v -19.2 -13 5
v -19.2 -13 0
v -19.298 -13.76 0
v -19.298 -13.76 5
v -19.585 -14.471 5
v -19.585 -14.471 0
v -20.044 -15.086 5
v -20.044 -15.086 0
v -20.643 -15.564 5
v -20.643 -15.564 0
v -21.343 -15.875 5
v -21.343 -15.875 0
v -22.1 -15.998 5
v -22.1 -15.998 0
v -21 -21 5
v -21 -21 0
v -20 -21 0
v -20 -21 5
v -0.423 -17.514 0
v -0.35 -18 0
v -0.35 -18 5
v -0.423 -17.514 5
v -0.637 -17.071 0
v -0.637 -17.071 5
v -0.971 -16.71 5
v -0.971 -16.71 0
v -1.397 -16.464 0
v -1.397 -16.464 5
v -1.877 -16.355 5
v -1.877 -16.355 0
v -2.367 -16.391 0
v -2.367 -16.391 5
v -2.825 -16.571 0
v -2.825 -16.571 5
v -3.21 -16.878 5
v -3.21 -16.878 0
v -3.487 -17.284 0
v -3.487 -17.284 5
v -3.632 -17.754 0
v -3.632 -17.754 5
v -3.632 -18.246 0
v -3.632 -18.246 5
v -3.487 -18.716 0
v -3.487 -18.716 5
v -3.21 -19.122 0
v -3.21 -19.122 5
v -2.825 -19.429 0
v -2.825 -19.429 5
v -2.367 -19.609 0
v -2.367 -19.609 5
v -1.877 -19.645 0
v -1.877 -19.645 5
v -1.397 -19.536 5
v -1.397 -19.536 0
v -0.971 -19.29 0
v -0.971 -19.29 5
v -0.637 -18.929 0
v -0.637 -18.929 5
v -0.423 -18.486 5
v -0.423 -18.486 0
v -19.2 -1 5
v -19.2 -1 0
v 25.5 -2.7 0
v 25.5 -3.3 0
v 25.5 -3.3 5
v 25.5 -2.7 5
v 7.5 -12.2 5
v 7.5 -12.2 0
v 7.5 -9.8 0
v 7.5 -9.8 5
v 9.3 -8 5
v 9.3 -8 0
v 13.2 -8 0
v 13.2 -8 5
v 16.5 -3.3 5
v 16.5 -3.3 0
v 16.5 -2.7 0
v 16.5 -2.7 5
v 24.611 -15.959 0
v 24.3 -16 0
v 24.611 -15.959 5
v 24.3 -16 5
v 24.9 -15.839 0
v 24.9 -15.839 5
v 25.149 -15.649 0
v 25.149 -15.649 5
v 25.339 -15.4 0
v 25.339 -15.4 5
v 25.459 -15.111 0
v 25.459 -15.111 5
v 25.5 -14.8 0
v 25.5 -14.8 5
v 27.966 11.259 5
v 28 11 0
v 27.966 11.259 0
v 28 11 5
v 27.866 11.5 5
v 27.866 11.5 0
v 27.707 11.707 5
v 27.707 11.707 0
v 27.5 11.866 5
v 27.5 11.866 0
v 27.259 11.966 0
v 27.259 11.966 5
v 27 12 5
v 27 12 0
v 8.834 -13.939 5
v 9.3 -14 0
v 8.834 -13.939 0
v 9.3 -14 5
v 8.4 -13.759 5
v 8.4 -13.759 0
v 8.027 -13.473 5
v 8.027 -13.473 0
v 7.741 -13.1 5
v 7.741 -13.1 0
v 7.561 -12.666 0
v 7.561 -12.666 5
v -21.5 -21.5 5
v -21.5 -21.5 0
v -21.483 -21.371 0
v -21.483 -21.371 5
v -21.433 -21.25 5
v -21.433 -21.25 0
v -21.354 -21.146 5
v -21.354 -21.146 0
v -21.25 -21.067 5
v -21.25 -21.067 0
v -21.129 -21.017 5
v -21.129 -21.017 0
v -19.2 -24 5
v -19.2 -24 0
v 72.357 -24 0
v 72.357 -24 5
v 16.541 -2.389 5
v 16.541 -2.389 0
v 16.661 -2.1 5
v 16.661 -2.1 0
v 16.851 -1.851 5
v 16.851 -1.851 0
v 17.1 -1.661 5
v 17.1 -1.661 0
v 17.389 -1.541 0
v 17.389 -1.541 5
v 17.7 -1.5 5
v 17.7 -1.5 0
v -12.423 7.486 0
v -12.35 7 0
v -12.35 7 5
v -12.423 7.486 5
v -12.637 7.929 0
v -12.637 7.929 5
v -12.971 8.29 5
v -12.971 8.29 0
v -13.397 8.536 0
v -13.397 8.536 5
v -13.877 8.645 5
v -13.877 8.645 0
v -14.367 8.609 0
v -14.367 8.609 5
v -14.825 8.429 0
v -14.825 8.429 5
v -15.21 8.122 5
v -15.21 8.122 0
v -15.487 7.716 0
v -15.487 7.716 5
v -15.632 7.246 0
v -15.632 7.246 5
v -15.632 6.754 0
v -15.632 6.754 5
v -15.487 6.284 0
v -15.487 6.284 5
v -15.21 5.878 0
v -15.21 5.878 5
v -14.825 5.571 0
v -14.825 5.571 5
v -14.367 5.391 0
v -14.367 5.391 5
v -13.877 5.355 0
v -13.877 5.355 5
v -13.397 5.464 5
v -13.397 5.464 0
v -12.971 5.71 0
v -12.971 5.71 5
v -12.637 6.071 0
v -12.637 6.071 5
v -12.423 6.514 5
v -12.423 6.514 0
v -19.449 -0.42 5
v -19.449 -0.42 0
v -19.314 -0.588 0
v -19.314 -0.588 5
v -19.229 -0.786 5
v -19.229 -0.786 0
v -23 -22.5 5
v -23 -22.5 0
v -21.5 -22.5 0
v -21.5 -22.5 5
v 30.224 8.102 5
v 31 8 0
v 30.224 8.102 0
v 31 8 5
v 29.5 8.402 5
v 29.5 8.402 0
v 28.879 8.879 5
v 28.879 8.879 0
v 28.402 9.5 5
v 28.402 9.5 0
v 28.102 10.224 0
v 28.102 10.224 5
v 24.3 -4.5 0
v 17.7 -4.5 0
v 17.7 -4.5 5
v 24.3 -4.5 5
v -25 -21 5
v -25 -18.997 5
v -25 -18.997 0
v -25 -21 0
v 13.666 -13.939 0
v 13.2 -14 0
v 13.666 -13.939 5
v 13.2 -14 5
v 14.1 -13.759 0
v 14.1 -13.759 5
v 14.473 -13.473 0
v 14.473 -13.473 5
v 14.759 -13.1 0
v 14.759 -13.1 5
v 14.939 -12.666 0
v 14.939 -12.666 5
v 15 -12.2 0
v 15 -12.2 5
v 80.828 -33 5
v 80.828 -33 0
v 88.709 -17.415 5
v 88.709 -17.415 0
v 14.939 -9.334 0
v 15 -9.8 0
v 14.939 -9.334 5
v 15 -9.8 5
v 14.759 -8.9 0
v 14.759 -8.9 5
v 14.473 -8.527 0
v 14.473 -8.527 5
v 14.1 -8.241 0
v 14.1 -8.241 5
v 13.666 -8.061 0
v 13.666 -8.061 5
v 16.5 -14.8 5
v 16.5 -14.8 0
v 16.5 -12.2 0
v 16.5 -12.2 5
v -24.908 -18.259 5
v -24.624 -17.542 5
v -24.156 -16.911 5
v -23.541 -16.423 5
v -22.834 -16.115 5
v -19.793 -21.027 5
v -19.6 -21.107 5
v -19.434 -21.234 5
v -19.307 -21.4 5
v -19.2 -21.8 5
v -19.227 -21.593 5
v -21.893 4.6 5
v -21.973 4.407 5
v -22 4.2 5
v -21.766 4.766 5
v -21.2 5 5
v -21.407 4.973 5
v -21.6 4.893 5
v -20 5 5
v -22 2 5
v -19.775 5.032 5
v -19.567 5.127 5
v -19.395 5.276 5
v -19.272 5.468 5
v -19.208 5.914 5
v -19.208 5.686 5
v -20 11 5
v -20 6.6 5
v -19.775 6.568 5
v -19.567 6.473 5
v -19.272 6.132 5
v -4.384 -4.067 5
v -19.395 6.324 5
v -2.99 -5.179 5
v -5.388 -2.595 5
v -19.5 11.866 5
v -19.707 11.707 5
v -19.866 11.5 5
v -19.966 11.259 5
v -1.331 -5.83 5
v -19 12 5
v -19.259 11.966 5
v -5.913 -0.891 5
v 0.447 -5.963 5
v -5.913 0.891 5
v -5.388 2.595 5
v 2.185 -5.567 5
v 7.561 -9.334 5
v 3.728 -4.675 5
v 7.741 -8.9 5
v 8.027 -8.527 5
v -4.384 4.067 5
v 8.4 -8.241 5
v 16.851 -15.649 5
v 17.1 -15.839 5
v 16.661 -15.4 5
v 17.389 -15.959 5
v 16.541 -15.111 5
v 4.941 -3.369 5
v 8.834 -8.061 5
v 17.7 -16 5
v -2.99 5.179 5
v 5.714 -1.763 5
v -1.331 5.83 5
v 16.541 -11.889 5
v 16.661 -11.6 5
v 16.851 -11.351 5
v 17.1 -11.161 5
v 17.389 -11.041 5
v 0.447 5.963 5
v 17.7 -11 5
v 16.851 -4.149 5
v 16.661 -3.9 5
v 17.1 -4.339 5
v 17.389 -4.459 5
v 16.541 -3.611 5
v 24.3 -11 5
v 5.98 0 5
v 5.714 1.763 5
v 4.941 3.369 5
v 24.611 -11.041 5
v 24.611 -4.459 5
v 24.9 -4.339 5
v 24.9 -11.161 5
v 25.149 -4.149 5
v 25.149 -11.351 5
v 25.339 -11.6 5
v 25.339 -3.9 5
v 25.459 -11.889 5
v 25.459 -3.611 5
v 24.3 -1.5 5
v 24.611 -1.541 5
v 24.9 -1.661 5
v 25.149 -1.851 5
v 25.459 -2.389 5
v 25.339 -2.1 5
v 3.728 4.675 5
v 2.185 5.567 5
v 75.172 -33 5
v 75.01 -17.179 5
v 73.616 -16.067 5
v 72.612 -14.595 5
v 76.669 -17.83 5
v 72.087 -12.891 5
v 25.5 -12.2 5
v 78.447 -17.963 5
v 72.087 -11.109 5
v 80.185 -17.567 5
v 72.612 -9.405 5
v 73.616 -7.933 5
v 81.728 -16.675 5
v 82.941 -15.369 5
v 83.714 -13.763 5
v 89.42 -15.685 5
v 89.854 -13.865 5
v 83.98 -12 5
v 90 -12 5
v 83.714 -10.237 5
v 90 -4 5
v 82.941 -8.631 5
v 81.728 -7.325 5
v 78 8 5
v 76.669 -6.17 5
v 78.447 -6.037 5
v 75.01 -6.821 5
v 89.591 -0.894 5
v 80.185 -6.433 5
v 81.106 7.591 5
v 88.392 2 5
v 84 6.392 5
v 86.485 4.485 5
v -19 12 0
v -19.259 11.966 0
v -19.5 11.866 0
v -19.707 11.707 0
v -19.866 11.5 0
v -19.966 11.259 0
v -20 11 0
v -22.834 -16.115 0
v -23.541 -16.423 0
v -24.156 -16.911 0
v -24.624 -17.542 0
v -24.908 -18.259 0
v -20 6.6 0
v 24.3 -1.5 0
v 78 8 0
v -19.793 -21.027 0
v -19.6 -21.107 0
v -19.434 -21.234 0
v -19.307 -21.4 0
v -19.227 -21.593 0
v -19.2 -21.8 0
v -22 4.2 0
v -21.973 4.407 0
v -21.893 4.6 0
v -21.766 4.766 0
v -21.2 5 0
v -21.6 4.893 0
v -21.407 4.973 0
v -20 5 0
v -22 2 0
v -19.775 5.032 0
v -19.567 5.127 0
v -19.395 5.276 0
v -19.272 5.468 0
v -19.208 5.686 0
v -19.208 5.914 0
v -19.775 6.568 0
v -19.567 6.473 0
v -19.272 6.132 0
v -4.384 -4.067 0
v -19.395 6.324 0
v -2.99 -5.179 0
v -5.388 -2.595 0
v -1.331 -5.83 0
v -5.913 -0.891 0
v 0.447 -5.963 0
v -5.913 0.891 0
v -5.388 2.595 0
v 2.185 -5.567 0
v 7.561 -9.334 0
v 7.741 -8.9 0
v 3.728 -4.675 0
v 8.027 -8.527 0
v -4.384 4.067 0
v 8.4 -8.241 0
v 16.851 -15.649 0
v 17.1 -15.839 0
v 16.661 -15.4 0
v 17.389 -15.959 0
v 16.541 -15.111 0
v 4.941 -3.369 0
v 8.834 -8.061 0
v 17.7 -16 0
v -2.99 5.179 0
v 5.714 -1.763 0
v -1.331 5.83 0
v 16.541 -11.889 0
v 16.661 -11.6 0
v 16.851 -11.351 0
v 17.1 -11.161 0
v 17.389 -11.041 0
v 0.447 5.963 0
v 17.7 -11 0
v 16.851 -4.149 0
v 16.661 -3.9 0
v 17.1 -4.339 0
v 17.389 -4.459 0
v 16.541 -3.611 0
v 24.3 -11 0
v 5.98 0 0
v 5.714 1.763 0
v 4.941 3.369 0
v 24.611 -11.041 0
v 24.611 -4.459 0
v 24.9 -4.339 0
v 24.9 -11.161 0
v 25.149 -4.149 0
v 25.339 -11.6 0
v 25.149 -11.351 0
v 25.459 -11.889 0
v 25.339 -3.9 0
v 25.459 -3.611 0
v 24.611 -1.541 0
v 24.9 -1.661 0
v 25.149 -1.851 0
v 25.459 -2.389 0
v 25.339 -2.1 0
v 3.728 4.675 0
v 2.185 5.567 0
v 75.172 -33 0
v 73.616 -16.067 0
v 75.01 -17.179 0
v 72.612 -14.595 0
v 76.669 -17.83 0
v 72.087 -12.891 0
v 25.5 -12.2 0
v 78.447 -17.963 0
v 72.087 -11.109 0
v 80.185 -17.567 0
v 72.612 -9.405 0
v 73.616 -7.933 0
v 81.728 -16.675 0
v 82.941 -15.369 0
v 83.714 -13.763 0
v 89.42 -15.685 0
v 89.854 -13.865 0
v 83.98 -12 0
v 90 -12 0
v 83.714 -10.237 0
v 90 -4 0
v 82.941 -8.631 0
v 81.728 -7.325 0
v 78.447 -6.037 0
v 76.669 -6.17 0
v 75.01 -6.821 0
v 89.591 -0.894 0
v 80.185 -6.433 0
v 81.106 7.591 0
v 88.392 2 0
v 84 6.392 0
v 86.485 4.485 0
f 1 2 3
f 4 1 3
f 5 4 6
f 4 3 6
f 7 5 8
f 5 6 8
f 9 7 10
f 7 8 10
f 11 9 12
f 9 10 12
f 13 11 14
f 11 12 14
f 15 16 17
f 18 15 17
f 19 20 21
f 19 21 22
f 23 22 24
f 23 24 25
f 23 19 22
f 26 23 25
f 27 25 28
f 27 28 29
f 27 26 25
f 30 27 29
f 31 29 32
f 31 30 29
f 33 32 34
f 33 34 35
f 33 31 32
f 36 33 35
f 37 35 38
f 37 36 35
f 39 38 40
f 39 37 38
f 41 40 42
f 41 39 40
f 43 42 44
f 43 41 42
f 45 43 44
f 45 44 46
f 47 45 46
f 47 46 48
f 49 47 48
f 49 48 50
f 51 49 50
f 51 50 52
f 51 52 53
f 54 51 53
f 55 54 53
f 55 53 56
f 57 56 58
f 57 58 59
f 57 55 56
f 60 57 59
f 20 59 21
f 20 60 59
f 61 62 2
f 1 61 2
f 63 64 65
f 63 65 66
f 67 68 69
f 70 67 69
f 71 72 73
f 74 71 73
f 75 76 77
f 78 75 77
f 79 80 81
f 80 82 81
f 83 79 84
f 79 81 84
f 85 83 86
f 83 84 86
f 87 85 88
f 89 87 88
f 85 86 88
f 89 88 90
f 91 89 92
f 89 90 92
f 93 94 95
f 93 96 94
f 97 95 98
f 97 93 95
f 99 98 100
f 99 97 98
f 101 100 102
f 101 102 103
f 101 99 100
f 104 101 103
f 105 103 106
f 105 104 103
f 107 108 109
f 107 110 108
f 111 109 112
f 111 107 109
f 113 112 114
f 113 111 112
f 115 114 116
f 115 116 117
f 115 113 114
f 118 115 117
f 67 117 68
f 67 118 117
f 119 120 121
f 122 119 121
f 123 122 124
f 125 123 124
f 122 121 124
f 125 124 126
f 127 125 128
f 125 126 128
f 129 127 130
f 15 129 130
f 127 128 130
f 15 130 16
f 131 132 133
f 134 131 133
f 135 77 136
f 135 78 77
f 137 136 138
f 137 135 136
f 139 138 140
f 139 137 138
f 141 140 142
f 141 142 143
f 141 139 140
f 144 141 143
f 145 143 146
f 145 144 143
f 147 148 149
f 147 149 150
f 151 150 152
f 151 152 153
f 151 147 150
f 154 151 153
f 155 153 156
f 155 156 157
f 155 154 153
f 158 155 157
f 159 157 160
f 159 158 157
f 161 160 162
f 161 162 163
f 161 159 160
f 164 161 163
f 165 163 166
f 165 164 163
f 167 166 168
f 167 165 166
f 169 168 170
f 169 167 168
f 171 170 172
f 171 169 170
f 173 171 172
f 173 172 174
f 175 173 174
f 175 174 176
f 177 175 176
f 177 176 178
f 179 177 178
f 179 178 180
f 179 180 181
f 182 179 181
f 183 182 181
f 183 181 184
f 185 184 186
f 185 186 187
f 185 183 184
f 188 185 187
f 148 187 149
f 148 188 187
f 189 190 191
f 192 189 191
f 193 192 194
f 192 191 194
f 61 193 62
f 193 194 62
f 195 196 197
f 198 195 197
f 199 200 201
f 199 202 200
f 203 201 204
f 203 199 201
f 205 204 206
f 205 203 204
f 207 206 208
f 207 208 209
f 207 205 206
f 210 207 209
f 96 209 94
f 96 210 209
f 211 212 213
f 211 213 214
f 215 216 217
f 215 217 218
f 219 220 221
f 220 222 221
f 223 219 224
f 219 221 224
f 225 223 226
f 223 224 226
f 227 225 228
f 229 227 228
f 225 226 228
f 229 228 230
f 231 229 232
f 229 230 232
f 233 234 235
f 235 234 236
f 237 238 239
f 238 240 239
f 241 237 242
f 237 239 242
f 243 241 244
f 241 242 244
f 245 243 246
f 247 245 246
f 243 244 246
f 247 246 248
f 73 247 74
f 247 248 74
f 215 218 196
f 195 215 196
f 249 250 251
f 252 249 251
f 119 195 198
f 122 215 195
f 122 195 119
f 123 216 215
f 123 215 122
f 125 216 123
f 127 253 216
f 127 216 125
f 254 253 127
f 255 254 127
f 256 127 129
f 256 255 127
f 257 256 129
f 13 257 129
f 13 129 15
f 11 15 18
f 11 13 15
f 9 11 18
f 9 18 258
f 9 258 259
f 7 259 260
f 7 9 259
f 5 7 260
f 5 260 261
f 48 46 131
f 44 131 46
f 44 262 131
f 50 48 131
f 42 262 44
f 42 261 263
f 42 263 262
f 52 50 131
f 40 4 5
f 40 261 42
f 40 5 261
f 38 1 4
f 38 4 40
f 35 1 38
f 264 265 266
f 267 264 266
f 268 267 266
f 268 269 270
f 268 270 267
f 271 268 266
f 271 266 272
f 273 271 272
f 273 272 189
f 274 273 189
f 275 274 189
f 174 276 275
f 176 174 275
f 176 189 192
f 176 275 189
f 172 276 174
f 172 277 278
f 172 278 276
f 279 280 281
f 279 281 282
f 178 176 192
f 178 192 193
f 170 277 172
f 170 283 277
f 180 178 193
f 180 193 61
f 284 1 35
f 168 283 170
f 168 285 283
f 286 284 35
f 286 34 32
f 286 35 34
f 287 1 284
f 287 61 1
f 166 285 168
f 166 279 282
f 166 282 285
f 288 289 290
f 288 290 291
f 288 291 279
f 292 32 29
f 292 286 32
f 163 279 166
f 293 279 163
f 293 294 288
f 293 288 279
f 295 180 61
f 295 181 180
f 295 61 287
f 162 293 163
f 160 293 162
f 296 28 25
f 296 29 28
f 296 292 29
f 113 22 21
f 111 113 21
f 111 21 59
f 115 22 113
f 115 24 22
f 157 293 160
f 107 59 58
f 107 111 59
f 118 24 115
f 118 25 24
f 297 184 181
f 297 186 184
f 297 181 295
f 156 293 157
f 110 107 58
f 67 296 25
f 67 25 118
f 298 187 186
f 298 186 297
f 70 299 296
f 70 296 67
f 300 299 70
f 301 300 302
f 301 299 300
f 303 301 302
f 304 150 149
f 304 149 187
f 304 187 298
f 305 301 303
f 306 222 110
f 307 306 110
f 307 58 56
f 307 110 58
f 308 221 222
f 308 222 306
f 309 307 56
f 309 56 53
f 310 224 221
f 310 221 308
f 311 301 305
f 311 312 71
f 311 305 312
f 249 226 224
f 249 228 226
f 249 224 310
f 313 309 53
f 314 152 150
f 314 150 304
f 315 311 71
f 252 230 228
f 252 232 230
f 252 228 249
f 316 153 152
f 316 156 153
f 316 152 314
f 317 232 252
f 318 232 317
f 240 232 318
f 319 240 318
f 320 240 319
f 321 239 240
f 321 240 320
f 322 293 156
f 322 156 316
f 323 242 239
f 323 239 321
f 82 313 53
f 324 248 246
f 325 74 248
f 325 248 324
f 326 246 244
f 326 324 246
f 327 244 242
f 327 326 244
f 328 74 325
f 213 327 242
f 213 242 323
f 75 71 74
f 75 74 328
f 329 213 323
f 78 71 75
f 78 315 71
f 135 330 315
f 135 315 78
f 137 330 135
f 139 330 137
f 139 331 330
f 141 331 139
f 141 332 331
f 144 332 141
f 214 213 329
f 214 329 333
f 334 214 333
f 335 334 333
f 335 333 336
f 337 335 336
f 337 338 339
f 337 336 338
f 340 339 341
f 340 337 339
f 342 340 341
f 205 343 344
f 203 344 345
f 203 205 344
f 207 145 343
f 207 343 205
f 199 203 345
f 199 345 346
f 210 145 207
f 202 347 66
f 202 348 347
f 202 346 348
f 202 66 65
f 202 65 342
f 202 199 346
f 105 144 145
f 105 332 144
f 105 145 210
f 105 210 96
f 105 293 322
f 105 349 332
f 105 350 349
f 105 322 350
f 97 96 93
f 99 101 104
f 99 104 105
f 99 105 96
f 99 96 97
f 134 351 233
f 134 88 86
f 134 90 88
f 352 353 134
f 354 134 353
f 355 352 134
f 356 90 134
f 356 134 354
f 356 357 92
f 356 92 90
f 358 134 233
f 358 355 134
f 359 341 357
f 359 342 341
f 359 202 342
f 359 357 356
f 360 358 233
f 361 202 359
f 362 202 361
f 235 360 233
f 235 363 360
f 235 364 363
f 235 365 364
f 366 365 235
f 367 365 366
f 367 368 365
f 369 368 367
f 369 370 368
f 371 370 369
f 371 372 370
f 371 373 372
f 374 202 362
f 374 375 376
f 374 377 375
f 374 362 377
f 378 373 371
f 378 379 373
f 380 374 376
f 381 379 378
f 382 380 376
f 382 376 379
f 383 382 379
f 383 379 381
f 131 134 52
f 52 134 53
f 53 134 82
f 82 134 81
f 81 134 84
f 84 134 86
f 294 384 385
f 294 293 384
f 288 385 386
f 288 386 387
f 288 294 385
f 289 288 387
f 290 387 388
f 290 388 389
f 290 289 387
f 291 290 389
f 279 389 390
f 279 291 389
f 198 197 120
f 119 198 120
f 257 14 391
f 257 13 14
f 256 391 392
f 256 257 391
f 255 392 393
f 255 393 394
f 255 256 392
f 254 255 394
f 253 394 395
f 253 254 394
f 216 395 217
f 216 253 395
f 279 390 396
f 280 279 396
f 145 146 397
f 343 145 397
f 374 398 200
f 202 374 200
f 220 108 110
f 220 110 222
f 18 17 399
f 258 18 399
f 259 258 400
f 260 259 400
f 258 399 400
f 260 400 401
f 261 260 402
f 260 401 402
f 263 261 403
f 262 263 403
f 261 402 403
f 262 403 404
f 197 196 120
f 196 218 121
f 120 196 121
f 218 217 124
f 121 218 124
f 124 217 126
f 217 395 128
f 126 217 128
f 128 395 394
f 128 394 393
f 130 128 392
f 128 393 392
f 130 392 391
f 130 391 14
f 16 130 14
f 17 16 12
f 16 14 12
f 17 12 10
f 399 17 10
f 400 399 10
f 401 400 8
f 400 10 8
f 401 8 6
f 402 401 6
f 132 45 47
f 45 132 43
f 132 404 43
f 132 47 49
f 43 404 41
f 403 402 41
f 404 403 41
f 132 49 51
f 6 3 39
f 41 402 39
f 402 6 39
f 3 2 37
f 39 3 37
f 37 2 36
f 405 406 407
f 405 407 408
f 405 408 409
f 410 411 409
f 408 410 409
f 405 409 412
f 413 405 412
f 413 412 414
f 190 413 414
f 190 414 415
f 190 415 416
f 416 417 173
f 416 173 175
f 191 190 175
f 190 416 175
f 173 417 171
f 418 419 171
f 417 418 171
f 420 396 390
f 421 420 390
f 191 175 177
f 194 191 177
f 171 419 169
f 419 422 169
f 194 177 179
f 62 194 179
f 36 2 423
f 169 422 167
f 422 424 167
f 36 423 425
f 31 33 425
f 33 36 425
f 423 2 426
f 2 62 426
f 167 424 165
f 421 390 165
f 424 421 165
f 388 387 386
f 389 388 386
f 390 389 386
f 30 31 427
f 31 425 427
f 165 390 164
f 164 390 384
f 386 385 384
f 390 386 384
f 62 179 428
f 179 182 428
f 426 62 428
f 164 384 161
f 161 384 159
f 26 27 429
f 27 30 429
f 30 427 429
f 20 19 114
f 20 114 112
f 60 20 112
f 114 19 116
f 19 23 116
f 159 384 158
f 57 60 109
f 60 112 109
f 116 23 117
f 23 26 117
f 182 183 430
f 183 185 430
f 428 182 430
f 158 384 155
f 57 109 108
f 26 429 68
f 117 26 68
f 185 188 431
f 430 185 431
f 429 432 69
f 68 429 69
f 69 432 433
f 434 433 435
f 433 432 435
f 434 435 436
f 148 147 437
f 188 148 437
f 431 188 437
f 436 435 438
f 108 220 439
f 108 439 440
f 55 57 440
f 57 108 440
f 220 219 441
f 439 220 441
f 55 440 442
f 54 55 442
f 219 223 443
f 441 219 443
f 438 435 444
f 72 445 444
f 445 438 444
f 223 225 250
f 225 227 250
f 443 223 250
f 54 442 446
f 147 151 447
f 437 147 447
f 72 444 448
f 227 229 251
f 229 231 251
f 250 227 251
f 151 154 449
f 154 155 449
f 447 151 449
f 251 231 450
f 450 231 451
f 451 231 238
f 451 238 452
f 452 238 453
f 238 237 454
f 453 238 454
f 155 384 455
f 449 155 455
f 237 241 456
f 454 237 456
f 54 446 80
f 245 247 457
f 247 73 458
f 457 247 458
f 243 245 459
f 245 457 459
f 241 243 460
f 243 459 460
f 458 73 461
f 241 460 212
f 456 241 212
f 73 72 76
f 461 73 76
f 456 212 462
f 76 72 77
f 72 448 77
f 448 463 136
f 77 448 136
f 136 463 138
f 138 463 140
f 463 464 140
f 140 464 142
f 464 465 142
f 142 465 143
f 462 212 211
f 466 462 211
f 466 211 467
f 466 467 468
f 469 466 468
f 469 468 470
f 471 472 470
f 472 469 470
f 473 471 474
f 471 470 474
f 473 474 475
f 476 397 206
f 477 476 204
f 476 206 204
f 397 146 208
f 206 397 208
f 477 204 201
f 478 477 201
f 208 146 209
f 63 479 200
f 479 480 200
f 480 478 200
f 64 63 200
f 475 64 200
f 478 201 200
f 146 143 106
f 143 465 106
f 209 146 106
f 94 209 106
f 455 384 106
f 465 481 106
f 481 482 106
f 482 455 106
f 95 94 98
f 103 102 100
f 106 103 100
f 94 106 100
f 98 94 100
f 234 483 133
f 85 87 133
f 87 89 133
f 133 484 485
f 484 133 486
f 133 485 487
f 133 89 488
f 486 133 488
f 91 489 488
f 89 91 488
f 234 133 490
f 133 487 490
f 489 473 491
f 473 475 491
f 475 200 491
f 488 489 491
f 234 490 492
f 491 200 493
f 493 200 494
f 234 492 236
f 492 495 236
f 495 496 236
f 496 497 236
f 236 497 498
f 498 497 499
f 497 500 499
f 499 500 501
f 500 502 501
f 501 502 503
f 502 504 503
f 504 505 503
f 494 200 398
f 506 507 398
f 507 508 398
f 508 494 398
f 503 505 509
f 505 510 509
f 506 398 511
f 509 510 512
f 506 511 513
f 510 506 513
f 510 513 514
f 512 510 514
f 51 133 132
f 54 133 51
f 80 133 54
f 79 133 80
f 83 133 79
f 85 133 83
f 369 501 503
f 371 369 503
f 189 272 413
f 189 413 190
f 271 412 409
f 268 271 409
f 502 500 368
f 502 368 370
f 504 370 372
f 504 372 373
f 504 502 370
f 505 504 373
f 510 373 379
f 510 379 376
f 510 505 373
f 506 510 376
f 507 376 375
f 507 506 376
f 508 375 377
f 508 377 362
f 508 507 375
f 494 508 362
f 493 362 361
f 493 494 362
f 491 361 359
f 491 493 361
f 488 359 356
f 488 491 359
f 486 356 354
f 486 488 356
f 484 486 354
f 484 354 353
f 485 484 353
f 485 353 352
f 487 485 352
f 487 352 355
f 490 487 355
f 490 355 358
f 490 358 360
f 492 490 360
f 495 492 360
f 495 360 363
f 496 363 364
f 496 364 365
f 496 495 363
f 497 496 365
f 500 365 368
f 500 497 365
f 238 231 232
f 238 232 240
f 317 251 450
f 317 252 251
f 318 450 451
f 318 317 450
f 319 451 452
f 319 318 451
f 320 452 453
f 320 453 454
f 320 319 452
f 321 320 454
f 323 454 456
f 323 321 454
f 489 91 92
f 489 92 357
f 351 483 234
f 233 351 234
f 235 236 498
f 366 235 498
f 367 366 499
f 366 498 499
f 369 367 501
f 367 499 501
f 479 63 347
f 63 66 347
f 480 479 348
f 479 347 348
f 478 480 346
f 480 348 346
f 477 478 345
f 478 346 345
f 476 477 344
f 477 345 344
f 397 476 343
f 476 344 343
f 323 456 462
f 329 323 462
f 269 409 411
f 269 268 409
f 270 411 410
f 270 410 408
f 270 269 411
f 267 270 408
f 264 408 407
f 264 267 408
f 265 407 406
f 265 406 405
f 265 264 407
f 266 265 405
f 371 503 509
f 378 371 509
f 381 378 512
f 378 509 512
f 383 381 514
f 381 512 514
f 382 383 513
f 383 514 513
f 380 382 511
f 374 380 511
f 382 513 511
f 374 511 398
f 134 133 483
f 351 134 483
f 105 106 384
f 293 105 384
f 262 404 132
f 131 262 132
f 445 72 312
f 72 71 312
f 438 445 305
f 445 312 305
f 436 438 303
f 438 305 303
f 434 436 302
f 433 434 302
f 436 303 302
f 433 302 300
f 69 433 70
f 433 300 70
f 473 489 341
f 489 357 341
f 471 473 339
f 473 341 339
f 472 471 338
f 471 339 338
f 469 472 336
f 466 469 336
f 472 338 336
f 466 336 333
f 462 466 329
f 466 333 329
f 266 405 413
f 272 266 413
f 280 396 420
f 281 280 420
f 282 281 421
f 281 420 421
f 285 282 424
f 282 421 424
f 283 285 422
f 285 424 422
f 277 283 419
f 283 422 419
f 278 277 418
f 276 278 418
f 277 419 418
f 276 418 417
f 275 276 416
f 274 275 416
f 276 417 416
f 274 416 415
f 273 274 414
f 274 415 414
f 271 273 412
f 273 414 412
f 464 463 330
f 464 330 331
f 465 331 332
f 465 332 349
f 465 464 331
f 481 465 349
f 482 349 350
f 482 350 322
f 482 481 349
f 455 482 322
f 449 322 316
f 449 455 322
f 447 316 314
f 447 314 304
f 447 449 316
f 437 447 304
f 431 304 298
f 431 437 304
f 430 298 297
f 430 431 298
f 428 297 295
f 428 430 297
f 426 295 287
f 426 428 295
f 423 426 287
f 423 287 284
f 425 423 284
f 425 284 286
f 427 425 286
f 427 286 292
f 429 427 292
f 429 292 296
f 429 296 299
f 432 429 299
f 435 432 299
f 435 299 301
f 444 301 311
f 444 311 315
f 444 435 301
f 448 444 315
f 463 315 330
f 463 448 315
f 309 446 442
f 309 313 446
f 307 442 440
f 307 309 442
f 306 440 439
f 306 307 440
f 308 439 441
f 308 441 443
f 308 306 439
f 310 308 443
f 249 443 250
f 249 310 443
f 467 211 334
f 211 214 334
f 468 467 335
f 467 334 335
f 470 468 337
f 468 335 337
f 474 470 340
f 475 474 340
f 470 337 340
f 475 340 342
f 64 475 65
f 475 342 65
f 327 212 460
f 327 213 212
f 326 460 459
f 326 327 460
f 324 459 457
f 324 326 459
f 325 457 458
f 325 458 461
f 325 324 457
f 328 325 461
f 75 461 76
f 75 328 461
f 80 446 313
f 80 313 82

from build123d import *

# Parameters (mm, degrees)
SKETCH1_R           = 5.98
SKETCH1_R_2         = 1.65
SKETCH1_W           = 9
SKETCH1_H           = 5
SKETCH1_H_2         = 3
SKETCH1_W_2         = 7.5
SKETCH1_H_3         = 6
BOSS_EXTRUDE1_DEPTH = 5
FILLET1_R           = 1.2
FILLET2_R           = 3
FILLET3_R           = 1
FILLET5_R           = 1.8
FILLET6_R           = 0.8
FILLET7_R           = 3


with BuildPart() as part:
    # Sketch1 → Boss-Extrude1 (new body)
    with BuildSketch(Plane.XY):
        with BuildLine():
            Line((72.356568311, -24), (75.172081726, -33))
            Line((75.172081726, -33), (80.827918274, -33))
            Line((80.827918274, -33), (88.70873293, -17.415075165))
            ThreePointArc((88.70873293, -17.415075165), (89.67272023, -14.78345153), (90, -12))
            Line((90, -12), (90, -4))
            ThreePointArc((90, -4), (86.485281374, 4.485281374), (78, 8))
            Line((78, 8), (28, 8))
            Line((28, 8), (28, 12))
            Line((28, 12), (-20, 12))
            Line((-20, 12), (-20, 6.6))
            ThreePointArc((-20, 6.6), (-19.2, 5.8), (-20, 5))
            Line((-20, 5), (-22, 5))
            Line((-22, 5), (-22, 2))
            Line((-22, 2), (-19.449413077, -0.419608718))
            ThreePointArc((-19.449413077, -0.419608718), (-19.264993354, -0.684143655), (-19.2, -1))
            Line((-19.2, -1), (-19.2, -13))
            ThreePointArc((-19.2, -13), (-20.078679656, -15.121320344), (-22.2, -16))
            Line((-22.2, -16), (-25, -16))
            Line((-25, -16), (-25, -21))
            Line((-25, -21), (-23, -22.5))
            Line((-23, -22.5), (-21.5, -22.5))
            Line((-21.5, -22.5), (-21.5, -21.5))
            ThreePointArc((-21.5, -21.5), (-21.353553391, -21.146446609), (-21, -21))
            Line((-21, -21), (-20, -21))
            ThreePointArc((-20, -21), (-19.434314575, -21.234314575), (-19.2, -21.8))
            Line((-19.2, -21.8), (-19.2, -24))
            Line((-19.2, -24), (72.356568311, -24))
        make_face()
        Circle(SKETCH1_R, mode=Mode.SUBTRACT)
        with Locations((78, -12)):
            Circle(SKETCH1_R, mode=Mode.SUBTRACT)
        with Locations((-14, 7)):
            Circle(SKETCH1_R_2, mode=Mode.SUBTRACT)
        with Locations((-2, -18)):
            Circle(SKETCH1_R_2, mode=Mode.SUBTRACT)
        with Locations((21, -13.5)):
            Rectangle(SKETCH1_W, SKETCH1_H, mode=Mode.SUBTRACT)
        with Locations((21, -3)):
            Rectangle(SKETCH1_W, SKETCH1_H_2, mode=Mode.SUBTRACT)
        with Locations((11.25, -11)):
            Rectangle(SKETCH1_W_2, SKETCH1_H_3, mode=Mode.SUBTRACT)
    extrude(amount=BOSS_EXTRUDE1_DEPTH)

    # Fillet1
    fillet1_edges = [part.edges().sort_by_distance(p)[0] for p in [
        (16.5, -11, 2.5),
        (16.5, -16, 2.5),
        (25.5, -16, 2.5),
        (25.5, -11, 2.5),
        (16.5, -1.5, 2.5),
        (16.5, -4.5, 2.5),
        (25.5, -4.5, 2.5),
        (25.5, -1.5, 2.5),
    ]]
    fillet(fillet1_edges, radius=FILLET1_R)

    # Fillet2
    fillet2_edges = [part.edges().sort_by_distance(p)[0] for p in [
        (28, 8, 2.5),
    ]]
    fillet(fillet2_edges, radius=FILLET2_R)

    # Fillet3
    fillet3_edges = [part.edges().sort_by_distance(p)[0] for p in [
        (28, 12, 2.5),
        (-20, 12, 2.5),
    ]]
    fillet(fillet3_edges, radius=FILLET3_R - 0.0001)  # a hair under: the kernel refuses the full size

    # Fillet5
    fillet5_edges = [part.edges().sort_by_distance(p)[0] for p in [
        (7.5, -8, 2.5),
        (7.5, -14, 2.5),
        (15, -14, 2.5),
        (15, -8, 2.5),
    ]]
    fillet(fillet5_edges, radius=FILLET5_R)

    # Fillet6
    fillet6_edges = [part.edges().sort_by_distance(p)[0] for p in [
        (-22, 5, 2.5),
    ]]
    fillet(fillet6_edges, radius=FILLET6_R)

    # Fillet7
    fillet7_edges = [part.edges().sort_by_distance(p)[0] for p in [
        (-25, -16, 2.5),
    ]]
    fillet(fillet7_edges, radius=FILLET7_R)


solid = part.part
